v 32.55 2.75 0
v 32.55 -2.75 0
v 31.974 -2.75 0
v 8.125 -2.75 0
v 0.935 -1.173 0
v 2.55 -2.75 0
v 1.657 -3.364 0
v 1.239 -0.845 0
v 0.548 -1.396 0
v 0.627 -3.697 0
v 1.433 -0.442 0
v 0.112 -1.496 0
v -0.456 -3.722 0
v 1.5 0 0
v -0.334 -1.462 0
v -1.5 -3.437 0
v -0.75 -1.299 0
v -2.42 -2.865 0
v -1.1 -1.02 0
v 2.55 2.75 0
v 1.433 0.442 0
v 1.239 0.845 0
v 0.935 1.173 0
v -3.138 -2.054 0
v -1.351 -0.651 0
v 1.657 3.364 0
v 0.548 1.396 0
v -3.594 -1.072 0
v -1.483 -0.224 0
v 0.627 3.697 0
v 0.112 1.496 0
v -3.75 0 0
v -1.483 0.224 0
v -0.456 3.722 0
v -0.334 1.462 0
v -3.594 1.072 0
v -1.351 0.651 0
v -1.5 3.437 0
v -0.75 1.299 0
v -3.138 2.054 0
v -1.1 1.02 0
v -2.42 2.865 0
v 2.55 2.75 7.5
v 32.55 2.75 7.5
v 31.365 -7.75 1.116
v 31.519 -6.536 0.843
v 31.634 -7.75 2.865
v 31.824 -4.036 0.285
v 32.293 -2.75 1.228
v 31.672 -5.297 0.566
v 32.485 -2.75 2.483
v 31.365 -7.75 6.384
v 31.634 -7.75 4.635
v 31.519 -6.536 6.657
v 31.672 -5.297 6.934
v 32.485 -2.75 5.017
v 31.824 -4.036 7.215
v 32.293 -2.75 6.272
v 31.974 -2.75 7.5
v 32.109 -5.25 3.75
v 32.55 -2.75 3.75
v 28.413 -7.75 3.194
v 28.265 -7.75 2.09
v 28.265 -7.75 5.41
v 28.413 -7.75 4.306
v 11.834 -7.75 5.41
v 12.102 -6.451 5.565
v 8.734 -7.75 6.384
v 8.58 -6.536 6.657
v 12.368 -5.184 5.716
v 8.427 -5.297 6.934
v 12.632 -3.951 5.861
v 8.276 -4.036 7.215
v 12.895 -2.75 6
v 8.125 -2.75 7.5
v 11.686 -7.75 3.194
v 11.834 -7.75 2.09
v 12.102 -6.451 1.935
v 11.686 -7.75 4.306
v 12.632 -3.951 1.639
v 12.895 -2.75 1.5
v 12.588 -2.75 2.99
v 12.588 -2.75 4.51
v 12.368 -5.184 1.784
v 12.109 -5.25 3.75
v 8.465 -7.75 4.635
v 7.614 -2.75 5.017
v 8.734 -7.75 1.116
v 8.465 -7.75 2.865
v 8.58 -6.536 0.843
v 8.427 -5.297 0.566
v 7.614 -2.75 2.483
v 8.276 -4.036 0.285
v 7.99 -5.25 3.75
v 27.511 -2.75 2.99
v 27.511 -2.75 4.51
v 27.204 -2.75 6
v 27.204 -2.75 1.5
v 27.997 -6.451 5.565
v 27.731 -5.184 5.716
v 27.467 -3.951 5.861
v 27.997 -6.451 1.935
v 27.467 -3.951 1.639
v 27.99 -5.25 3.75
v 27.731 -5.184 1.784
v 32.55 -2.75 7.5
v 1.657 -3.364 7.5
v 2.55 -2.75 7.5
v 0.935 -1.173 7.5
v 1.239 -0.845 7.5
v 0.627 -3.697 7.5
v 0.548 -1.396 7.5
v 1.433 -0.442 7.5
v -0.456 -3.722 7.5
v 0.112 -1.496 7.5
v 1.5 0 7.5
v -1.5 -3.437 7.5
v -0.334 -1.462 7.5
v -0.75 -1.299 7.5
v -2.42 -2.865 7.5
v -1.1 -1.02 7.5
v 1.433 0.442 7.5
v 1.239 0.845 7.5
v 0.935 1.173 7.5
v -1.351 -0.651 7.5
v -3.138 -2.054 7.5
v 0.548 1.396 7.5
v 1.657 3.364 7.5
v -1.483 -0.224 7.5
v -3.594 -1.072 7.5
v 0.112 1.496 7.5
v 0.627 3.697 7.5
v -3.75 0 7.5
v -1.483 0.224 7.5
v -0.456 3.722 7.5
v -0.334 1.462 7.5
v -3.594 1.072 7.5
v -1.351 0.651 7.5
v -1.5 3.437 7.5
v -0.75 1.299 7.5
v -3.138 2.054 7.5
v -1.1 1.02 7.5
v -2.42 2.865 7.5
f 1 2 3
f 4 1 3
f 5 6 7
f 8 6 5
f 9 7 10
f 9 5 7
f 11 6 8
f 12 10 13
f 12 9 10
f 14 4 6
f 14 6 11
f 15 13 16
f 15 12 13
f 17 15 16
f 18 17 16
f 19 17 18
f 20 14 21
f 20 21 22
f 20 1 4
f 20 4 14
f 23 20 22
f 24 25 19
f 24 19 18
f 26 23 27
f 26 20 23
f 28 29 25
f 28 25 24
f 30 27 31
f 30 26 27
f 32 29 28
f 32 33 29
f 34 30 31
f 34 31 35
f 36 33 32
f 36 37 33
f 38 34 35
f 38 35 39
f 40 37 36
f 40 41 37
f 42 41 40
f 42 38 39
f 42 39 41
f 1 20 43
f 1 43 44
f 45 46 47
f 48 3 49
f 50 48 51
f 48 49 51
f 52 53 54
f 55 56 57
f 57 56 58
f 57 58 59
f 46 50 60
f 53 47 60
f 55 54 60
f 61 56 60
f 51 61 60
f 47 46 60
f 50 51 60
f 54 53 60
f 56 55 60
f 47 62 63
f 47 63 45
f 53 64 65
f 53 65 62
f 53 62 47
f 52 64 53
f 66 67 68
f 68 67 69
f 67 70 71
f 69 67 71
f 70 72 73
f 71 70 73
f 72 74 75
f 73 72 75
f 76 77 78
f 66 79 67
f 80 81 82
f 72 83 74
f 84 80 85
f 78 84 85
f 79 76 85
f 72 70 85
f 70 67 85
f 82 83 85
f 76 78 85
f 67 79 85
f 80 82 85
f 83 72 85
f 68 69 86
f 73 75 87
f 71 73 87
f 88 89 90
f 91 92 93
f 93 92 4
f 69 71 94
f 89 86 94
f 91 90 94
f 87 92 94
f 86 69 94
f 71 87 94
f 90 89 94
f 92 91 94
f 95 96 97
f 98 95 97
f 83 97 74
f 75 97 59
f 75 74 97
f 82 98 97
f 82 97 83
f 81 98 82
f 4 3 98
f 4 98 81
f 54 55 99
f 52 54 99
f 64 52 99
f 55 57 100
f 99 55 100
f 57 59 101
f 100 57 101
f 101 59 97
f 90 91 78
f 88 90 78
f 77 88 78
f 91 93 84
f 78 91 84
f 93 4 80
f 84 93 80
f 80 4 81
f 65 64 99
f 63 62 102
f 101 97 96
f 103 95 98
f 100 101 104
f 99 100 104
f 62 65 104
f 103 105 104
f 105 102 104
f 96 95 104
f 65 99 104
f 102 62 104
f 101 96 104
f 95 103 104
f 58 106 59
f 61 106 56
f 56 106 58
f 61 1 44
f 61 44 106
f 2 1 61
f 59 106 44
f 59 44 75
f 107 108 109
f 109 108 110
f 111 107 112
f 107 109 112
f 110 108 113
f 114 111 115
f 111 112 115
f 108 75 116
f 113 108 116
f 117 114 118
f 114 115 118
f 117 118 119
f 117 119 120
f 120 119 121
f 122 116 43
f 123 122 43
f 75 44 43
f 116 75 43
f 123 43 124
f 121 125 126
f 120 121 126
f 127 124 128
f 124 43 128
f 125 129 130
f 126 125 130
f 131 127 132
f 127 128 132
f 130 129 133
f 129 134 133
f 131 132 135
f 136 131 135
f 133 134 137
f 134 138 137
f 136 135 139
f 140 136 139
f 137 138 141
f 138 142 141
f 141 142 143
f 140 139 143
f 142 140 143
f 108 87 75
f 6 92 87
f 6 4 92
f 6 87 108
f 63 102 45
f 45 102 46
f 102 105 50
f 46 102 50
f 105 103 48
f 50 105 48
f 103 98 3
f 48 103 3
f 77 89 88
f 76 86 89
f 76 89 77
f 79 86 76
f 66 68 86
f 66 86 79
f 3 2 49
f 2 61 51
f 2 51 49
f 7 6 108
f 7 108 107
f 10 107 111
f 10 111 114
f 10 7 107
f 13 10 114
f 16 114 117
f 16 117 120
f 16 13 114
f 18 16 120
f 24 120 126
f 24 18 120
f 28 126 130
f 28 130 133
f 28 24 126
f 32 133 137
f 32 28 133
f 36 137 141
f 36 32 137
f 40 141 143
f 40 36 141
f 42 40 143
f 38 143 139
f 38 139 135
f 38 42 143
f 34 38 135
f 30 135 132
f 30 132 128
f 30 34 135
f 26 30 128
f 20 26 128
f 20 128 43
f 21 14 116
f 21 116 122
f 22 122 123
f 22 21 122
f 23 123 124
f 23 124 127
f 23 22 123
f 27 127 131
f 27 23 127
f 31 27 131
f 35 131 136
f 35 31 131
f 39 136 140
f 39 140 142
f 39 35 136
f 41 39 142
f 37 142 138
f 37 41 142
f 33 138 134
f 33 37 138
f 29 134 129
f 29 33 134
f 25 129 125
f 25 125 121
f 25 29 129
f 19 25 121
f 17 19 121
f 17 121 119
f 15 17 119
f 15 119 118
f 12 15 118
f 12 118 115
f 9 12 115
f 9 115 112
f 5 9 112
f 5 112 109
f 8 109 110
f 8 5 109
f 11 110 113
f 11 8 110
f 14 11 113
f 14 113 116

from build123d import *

# Parameters (mm, degrees)
SKETCH1_R                     = 1.5
BOSS_EXTRUDE1_DEPTH           = 7.5
BOSS_EXTRUDE3_DEPTH           = 5
BOSS_EXTRUDE3_DRAFT           = 10
BOSS_EXTRUDE3_PROFILE_2_DEPTH = 5
BOSS_EXTRUDE3_PROFILE_2_DRAFT = 10


with BuildPart() as part:
    # Sketch1 → Boss-Extrude1 (new body)
    with BuildSketch(Plane.XY):
        with BuildLine():
            Line((2.549509757, 2.75), (32.549509757, 2.75))
            Line((32.549509757, 2.75), (32.549509757, -2.75))
            Line((32.549509757, -2.75), (22.049509757, -2.75))
            Line((22.049509757, -2.75), (2.549509757, -2.75))
            ThreePointArc((2.549509757, -2.75), (-3.75, 0), (2.549509757, 2.75))
        make_face()
        Circle(SKETCH1_R, mode=Mode.SUBTRACT)
    extrude(amount=BOSS_EXTRUDE1_DEPTH)


with BuildPart() as boss_extrude3_tool:
    # Sketch2 → Boss-Extrude3 (with draft: the straight prism first)
    with BuildSketch(Plane.XZ.offset(2.75)):
        with BuildLine():
            Line((31.973749775, 7.5), (27.204053767, 6))
            ThreePointArc((27.204053767, 6), (27.549509757, 3.75), (27.204053767, 1.5))
            Line((27.204053767, 1.5), (31.973749775, 0))
            ThreePointArc((31.973749775, 0), (32.549509757, 3.75), (31.973749775, 7.5))
        make_face()
    extrude(amount=BOSS_EXTRUDE3_DEPTH)
    # Boss-Extrude3: the draft: its side faces are tilted about the plane it starts from
    boss_extrude3_sides = [boss_extrude3_tool.faces().sort_by_distance(p)[0] for p in [
        (32.549509757, -5.25, 3.75),
        (29.588901771, -5.25, 6.75),
        (27.549509757, -5.25, 3.75),
        (29.588901771, -5.25, 0.75),
    ]]
    draft(boss_extrude3_sides, Plane.XZ.offset(2.75), BOSS_EXTRUDE3_DRAFT)


with BuildPart() as part_1:
    add(part.part)

    # Boss-Extrude3: add boss_extrude3_tool
    add(boss_extrude3_tool.part)


with BuildPart() as boss_extrude3_profile_2_tool:
    # Sketch2 → Boss-Extrude3 profile 2 (with draft: the straight prism first)
    with BuildSketch(Plane.XZ.offset(2.75)):
        with BuildLine():
            ThreePointArc((8.125269739, 7.5), (7.549509757, 3.75), (8.125269739, 0))
            Line((8.125269739, 0), (12.894965746, 1.5))
            ThreePointArc((12.894965746, 1.5), (12.549509757, 3.75), (12.894965746, 6))
            Line((12.894965746, 6), (8.125269739, 7.5))
        make_face()
    extrude(amount=BOSS_EXTRUDE3_PROFILE_2_DEPTH)
    # Boss-Extrude3 profile 2: the draft: its side faces are tilted about the plane it starts from
    boss_extrude3_profile_2_sides = [boss_extrude3_profile_2_tool.faces().sort_by_distance(p)[0] for p in [
        (10.510117743, -5.25, 0.75),
        (12.549509757, -5.25, 3.75),
        (10.510117743, -5.25, 6.75),
        (7.549509757, -5.25, 3.75),
    ]]
    draft(boss_extrude3_profile_2_sides, Plane.XZ.offset(2.75), BOSS_EXTRUDE3_PROFILE_2_DRAFT)


with BuildPart() as part_2:
    add(part_1.part)

    # Boss-Extrude3 profile 2: add boss_extrude3_profile_2_tool
    add(boss_extrude3_profile_2_tool.part)


solid = part_2.part
